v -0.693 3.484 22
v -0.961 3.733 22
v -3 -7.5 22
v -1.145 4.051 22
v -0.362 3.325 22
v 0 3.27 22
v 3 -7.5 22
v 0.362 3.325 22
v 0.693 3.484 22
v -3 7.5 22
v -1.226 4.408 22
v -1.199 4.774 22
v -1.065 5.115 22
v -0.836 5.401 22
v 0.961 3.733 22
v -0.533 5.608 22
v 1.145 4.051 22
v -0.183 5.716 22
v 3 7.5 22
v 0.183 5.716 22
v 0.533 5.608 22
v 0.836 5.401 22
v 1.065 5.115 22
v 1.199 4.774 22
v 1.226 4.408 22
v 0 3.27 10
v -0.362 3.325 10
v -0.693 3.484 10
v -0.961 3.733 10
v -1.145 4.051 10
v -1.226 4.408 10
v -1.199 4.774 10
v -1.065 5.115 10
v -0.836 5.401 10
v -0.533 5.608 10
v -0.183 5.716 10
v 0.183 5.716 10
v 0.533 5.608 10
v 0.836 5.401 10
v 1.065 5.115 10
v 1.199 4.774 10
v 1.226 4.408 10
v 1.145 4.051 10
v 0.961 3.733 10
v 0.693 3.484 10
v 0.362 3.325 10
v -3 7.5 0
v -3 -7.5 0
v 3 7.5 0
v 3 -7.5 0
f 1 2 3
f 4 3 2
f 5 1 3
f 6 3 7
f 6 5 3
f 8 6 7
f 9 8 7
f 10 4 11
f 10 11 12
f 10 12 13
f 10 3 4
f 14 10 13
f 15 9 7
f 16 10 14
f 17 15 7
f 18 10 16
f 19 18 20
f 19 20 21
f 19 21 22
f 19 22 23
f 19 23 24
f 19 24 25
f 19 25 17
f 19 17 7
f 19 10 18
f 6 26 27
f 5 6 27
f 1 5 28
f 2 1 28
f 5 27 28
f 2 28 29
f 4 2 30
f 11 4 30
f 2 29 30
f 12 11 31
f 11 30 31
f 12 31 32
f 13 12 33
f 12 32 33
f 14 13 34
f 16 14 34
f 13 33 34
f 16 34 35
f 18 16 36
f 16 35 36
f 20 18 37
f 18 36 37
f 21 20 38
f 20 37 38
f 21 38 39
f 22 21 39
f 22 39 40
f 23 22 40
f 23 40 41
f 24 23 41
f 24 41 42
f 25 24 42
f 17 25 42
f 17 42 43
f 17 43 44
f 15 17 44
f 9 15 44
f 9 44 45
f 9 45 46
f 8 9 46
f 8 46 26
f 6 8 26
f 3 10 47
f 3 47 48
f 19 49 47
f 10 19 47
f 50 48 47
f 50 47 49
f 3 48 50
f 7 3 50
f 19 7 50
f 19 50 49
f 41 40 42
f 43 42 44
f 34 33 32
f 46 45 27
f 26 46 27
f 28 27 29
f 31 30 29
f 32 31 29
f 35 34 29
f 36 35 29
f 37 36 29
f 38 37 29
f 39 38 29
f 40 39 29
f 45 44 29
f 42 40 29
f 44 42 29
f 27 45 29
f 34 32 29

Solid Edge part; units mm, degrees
sketch "Sketch1" plane through (0, 0, 0) normal (0, 0, 1) x (1, 0, 0)
  line L0 (-3, -7.5) -> (3, -7.5)
  line L1 (3, -7.5) -> (3, 7.5)
  line L2 (3, 7.5) -> (-3, 7.5)
  line L3 (-3, 7.5) -> (-3, -7.5)
  dimension "D1" = 6
  dimension "D2" = 15
extrude "Ajout_matière_1" add sketch "Sketch1" along normal blind 22
hole "Perçage_1" [suppressed]
hole "Perçage_2" [suppressed]
hole "Perçage_3" at (0, 4.5, 22) direction (0, 0, -1) diameter 2.459 depth 12 thread major 3 thread length 0.01
properties material "Plastique ABS, haute performance"
